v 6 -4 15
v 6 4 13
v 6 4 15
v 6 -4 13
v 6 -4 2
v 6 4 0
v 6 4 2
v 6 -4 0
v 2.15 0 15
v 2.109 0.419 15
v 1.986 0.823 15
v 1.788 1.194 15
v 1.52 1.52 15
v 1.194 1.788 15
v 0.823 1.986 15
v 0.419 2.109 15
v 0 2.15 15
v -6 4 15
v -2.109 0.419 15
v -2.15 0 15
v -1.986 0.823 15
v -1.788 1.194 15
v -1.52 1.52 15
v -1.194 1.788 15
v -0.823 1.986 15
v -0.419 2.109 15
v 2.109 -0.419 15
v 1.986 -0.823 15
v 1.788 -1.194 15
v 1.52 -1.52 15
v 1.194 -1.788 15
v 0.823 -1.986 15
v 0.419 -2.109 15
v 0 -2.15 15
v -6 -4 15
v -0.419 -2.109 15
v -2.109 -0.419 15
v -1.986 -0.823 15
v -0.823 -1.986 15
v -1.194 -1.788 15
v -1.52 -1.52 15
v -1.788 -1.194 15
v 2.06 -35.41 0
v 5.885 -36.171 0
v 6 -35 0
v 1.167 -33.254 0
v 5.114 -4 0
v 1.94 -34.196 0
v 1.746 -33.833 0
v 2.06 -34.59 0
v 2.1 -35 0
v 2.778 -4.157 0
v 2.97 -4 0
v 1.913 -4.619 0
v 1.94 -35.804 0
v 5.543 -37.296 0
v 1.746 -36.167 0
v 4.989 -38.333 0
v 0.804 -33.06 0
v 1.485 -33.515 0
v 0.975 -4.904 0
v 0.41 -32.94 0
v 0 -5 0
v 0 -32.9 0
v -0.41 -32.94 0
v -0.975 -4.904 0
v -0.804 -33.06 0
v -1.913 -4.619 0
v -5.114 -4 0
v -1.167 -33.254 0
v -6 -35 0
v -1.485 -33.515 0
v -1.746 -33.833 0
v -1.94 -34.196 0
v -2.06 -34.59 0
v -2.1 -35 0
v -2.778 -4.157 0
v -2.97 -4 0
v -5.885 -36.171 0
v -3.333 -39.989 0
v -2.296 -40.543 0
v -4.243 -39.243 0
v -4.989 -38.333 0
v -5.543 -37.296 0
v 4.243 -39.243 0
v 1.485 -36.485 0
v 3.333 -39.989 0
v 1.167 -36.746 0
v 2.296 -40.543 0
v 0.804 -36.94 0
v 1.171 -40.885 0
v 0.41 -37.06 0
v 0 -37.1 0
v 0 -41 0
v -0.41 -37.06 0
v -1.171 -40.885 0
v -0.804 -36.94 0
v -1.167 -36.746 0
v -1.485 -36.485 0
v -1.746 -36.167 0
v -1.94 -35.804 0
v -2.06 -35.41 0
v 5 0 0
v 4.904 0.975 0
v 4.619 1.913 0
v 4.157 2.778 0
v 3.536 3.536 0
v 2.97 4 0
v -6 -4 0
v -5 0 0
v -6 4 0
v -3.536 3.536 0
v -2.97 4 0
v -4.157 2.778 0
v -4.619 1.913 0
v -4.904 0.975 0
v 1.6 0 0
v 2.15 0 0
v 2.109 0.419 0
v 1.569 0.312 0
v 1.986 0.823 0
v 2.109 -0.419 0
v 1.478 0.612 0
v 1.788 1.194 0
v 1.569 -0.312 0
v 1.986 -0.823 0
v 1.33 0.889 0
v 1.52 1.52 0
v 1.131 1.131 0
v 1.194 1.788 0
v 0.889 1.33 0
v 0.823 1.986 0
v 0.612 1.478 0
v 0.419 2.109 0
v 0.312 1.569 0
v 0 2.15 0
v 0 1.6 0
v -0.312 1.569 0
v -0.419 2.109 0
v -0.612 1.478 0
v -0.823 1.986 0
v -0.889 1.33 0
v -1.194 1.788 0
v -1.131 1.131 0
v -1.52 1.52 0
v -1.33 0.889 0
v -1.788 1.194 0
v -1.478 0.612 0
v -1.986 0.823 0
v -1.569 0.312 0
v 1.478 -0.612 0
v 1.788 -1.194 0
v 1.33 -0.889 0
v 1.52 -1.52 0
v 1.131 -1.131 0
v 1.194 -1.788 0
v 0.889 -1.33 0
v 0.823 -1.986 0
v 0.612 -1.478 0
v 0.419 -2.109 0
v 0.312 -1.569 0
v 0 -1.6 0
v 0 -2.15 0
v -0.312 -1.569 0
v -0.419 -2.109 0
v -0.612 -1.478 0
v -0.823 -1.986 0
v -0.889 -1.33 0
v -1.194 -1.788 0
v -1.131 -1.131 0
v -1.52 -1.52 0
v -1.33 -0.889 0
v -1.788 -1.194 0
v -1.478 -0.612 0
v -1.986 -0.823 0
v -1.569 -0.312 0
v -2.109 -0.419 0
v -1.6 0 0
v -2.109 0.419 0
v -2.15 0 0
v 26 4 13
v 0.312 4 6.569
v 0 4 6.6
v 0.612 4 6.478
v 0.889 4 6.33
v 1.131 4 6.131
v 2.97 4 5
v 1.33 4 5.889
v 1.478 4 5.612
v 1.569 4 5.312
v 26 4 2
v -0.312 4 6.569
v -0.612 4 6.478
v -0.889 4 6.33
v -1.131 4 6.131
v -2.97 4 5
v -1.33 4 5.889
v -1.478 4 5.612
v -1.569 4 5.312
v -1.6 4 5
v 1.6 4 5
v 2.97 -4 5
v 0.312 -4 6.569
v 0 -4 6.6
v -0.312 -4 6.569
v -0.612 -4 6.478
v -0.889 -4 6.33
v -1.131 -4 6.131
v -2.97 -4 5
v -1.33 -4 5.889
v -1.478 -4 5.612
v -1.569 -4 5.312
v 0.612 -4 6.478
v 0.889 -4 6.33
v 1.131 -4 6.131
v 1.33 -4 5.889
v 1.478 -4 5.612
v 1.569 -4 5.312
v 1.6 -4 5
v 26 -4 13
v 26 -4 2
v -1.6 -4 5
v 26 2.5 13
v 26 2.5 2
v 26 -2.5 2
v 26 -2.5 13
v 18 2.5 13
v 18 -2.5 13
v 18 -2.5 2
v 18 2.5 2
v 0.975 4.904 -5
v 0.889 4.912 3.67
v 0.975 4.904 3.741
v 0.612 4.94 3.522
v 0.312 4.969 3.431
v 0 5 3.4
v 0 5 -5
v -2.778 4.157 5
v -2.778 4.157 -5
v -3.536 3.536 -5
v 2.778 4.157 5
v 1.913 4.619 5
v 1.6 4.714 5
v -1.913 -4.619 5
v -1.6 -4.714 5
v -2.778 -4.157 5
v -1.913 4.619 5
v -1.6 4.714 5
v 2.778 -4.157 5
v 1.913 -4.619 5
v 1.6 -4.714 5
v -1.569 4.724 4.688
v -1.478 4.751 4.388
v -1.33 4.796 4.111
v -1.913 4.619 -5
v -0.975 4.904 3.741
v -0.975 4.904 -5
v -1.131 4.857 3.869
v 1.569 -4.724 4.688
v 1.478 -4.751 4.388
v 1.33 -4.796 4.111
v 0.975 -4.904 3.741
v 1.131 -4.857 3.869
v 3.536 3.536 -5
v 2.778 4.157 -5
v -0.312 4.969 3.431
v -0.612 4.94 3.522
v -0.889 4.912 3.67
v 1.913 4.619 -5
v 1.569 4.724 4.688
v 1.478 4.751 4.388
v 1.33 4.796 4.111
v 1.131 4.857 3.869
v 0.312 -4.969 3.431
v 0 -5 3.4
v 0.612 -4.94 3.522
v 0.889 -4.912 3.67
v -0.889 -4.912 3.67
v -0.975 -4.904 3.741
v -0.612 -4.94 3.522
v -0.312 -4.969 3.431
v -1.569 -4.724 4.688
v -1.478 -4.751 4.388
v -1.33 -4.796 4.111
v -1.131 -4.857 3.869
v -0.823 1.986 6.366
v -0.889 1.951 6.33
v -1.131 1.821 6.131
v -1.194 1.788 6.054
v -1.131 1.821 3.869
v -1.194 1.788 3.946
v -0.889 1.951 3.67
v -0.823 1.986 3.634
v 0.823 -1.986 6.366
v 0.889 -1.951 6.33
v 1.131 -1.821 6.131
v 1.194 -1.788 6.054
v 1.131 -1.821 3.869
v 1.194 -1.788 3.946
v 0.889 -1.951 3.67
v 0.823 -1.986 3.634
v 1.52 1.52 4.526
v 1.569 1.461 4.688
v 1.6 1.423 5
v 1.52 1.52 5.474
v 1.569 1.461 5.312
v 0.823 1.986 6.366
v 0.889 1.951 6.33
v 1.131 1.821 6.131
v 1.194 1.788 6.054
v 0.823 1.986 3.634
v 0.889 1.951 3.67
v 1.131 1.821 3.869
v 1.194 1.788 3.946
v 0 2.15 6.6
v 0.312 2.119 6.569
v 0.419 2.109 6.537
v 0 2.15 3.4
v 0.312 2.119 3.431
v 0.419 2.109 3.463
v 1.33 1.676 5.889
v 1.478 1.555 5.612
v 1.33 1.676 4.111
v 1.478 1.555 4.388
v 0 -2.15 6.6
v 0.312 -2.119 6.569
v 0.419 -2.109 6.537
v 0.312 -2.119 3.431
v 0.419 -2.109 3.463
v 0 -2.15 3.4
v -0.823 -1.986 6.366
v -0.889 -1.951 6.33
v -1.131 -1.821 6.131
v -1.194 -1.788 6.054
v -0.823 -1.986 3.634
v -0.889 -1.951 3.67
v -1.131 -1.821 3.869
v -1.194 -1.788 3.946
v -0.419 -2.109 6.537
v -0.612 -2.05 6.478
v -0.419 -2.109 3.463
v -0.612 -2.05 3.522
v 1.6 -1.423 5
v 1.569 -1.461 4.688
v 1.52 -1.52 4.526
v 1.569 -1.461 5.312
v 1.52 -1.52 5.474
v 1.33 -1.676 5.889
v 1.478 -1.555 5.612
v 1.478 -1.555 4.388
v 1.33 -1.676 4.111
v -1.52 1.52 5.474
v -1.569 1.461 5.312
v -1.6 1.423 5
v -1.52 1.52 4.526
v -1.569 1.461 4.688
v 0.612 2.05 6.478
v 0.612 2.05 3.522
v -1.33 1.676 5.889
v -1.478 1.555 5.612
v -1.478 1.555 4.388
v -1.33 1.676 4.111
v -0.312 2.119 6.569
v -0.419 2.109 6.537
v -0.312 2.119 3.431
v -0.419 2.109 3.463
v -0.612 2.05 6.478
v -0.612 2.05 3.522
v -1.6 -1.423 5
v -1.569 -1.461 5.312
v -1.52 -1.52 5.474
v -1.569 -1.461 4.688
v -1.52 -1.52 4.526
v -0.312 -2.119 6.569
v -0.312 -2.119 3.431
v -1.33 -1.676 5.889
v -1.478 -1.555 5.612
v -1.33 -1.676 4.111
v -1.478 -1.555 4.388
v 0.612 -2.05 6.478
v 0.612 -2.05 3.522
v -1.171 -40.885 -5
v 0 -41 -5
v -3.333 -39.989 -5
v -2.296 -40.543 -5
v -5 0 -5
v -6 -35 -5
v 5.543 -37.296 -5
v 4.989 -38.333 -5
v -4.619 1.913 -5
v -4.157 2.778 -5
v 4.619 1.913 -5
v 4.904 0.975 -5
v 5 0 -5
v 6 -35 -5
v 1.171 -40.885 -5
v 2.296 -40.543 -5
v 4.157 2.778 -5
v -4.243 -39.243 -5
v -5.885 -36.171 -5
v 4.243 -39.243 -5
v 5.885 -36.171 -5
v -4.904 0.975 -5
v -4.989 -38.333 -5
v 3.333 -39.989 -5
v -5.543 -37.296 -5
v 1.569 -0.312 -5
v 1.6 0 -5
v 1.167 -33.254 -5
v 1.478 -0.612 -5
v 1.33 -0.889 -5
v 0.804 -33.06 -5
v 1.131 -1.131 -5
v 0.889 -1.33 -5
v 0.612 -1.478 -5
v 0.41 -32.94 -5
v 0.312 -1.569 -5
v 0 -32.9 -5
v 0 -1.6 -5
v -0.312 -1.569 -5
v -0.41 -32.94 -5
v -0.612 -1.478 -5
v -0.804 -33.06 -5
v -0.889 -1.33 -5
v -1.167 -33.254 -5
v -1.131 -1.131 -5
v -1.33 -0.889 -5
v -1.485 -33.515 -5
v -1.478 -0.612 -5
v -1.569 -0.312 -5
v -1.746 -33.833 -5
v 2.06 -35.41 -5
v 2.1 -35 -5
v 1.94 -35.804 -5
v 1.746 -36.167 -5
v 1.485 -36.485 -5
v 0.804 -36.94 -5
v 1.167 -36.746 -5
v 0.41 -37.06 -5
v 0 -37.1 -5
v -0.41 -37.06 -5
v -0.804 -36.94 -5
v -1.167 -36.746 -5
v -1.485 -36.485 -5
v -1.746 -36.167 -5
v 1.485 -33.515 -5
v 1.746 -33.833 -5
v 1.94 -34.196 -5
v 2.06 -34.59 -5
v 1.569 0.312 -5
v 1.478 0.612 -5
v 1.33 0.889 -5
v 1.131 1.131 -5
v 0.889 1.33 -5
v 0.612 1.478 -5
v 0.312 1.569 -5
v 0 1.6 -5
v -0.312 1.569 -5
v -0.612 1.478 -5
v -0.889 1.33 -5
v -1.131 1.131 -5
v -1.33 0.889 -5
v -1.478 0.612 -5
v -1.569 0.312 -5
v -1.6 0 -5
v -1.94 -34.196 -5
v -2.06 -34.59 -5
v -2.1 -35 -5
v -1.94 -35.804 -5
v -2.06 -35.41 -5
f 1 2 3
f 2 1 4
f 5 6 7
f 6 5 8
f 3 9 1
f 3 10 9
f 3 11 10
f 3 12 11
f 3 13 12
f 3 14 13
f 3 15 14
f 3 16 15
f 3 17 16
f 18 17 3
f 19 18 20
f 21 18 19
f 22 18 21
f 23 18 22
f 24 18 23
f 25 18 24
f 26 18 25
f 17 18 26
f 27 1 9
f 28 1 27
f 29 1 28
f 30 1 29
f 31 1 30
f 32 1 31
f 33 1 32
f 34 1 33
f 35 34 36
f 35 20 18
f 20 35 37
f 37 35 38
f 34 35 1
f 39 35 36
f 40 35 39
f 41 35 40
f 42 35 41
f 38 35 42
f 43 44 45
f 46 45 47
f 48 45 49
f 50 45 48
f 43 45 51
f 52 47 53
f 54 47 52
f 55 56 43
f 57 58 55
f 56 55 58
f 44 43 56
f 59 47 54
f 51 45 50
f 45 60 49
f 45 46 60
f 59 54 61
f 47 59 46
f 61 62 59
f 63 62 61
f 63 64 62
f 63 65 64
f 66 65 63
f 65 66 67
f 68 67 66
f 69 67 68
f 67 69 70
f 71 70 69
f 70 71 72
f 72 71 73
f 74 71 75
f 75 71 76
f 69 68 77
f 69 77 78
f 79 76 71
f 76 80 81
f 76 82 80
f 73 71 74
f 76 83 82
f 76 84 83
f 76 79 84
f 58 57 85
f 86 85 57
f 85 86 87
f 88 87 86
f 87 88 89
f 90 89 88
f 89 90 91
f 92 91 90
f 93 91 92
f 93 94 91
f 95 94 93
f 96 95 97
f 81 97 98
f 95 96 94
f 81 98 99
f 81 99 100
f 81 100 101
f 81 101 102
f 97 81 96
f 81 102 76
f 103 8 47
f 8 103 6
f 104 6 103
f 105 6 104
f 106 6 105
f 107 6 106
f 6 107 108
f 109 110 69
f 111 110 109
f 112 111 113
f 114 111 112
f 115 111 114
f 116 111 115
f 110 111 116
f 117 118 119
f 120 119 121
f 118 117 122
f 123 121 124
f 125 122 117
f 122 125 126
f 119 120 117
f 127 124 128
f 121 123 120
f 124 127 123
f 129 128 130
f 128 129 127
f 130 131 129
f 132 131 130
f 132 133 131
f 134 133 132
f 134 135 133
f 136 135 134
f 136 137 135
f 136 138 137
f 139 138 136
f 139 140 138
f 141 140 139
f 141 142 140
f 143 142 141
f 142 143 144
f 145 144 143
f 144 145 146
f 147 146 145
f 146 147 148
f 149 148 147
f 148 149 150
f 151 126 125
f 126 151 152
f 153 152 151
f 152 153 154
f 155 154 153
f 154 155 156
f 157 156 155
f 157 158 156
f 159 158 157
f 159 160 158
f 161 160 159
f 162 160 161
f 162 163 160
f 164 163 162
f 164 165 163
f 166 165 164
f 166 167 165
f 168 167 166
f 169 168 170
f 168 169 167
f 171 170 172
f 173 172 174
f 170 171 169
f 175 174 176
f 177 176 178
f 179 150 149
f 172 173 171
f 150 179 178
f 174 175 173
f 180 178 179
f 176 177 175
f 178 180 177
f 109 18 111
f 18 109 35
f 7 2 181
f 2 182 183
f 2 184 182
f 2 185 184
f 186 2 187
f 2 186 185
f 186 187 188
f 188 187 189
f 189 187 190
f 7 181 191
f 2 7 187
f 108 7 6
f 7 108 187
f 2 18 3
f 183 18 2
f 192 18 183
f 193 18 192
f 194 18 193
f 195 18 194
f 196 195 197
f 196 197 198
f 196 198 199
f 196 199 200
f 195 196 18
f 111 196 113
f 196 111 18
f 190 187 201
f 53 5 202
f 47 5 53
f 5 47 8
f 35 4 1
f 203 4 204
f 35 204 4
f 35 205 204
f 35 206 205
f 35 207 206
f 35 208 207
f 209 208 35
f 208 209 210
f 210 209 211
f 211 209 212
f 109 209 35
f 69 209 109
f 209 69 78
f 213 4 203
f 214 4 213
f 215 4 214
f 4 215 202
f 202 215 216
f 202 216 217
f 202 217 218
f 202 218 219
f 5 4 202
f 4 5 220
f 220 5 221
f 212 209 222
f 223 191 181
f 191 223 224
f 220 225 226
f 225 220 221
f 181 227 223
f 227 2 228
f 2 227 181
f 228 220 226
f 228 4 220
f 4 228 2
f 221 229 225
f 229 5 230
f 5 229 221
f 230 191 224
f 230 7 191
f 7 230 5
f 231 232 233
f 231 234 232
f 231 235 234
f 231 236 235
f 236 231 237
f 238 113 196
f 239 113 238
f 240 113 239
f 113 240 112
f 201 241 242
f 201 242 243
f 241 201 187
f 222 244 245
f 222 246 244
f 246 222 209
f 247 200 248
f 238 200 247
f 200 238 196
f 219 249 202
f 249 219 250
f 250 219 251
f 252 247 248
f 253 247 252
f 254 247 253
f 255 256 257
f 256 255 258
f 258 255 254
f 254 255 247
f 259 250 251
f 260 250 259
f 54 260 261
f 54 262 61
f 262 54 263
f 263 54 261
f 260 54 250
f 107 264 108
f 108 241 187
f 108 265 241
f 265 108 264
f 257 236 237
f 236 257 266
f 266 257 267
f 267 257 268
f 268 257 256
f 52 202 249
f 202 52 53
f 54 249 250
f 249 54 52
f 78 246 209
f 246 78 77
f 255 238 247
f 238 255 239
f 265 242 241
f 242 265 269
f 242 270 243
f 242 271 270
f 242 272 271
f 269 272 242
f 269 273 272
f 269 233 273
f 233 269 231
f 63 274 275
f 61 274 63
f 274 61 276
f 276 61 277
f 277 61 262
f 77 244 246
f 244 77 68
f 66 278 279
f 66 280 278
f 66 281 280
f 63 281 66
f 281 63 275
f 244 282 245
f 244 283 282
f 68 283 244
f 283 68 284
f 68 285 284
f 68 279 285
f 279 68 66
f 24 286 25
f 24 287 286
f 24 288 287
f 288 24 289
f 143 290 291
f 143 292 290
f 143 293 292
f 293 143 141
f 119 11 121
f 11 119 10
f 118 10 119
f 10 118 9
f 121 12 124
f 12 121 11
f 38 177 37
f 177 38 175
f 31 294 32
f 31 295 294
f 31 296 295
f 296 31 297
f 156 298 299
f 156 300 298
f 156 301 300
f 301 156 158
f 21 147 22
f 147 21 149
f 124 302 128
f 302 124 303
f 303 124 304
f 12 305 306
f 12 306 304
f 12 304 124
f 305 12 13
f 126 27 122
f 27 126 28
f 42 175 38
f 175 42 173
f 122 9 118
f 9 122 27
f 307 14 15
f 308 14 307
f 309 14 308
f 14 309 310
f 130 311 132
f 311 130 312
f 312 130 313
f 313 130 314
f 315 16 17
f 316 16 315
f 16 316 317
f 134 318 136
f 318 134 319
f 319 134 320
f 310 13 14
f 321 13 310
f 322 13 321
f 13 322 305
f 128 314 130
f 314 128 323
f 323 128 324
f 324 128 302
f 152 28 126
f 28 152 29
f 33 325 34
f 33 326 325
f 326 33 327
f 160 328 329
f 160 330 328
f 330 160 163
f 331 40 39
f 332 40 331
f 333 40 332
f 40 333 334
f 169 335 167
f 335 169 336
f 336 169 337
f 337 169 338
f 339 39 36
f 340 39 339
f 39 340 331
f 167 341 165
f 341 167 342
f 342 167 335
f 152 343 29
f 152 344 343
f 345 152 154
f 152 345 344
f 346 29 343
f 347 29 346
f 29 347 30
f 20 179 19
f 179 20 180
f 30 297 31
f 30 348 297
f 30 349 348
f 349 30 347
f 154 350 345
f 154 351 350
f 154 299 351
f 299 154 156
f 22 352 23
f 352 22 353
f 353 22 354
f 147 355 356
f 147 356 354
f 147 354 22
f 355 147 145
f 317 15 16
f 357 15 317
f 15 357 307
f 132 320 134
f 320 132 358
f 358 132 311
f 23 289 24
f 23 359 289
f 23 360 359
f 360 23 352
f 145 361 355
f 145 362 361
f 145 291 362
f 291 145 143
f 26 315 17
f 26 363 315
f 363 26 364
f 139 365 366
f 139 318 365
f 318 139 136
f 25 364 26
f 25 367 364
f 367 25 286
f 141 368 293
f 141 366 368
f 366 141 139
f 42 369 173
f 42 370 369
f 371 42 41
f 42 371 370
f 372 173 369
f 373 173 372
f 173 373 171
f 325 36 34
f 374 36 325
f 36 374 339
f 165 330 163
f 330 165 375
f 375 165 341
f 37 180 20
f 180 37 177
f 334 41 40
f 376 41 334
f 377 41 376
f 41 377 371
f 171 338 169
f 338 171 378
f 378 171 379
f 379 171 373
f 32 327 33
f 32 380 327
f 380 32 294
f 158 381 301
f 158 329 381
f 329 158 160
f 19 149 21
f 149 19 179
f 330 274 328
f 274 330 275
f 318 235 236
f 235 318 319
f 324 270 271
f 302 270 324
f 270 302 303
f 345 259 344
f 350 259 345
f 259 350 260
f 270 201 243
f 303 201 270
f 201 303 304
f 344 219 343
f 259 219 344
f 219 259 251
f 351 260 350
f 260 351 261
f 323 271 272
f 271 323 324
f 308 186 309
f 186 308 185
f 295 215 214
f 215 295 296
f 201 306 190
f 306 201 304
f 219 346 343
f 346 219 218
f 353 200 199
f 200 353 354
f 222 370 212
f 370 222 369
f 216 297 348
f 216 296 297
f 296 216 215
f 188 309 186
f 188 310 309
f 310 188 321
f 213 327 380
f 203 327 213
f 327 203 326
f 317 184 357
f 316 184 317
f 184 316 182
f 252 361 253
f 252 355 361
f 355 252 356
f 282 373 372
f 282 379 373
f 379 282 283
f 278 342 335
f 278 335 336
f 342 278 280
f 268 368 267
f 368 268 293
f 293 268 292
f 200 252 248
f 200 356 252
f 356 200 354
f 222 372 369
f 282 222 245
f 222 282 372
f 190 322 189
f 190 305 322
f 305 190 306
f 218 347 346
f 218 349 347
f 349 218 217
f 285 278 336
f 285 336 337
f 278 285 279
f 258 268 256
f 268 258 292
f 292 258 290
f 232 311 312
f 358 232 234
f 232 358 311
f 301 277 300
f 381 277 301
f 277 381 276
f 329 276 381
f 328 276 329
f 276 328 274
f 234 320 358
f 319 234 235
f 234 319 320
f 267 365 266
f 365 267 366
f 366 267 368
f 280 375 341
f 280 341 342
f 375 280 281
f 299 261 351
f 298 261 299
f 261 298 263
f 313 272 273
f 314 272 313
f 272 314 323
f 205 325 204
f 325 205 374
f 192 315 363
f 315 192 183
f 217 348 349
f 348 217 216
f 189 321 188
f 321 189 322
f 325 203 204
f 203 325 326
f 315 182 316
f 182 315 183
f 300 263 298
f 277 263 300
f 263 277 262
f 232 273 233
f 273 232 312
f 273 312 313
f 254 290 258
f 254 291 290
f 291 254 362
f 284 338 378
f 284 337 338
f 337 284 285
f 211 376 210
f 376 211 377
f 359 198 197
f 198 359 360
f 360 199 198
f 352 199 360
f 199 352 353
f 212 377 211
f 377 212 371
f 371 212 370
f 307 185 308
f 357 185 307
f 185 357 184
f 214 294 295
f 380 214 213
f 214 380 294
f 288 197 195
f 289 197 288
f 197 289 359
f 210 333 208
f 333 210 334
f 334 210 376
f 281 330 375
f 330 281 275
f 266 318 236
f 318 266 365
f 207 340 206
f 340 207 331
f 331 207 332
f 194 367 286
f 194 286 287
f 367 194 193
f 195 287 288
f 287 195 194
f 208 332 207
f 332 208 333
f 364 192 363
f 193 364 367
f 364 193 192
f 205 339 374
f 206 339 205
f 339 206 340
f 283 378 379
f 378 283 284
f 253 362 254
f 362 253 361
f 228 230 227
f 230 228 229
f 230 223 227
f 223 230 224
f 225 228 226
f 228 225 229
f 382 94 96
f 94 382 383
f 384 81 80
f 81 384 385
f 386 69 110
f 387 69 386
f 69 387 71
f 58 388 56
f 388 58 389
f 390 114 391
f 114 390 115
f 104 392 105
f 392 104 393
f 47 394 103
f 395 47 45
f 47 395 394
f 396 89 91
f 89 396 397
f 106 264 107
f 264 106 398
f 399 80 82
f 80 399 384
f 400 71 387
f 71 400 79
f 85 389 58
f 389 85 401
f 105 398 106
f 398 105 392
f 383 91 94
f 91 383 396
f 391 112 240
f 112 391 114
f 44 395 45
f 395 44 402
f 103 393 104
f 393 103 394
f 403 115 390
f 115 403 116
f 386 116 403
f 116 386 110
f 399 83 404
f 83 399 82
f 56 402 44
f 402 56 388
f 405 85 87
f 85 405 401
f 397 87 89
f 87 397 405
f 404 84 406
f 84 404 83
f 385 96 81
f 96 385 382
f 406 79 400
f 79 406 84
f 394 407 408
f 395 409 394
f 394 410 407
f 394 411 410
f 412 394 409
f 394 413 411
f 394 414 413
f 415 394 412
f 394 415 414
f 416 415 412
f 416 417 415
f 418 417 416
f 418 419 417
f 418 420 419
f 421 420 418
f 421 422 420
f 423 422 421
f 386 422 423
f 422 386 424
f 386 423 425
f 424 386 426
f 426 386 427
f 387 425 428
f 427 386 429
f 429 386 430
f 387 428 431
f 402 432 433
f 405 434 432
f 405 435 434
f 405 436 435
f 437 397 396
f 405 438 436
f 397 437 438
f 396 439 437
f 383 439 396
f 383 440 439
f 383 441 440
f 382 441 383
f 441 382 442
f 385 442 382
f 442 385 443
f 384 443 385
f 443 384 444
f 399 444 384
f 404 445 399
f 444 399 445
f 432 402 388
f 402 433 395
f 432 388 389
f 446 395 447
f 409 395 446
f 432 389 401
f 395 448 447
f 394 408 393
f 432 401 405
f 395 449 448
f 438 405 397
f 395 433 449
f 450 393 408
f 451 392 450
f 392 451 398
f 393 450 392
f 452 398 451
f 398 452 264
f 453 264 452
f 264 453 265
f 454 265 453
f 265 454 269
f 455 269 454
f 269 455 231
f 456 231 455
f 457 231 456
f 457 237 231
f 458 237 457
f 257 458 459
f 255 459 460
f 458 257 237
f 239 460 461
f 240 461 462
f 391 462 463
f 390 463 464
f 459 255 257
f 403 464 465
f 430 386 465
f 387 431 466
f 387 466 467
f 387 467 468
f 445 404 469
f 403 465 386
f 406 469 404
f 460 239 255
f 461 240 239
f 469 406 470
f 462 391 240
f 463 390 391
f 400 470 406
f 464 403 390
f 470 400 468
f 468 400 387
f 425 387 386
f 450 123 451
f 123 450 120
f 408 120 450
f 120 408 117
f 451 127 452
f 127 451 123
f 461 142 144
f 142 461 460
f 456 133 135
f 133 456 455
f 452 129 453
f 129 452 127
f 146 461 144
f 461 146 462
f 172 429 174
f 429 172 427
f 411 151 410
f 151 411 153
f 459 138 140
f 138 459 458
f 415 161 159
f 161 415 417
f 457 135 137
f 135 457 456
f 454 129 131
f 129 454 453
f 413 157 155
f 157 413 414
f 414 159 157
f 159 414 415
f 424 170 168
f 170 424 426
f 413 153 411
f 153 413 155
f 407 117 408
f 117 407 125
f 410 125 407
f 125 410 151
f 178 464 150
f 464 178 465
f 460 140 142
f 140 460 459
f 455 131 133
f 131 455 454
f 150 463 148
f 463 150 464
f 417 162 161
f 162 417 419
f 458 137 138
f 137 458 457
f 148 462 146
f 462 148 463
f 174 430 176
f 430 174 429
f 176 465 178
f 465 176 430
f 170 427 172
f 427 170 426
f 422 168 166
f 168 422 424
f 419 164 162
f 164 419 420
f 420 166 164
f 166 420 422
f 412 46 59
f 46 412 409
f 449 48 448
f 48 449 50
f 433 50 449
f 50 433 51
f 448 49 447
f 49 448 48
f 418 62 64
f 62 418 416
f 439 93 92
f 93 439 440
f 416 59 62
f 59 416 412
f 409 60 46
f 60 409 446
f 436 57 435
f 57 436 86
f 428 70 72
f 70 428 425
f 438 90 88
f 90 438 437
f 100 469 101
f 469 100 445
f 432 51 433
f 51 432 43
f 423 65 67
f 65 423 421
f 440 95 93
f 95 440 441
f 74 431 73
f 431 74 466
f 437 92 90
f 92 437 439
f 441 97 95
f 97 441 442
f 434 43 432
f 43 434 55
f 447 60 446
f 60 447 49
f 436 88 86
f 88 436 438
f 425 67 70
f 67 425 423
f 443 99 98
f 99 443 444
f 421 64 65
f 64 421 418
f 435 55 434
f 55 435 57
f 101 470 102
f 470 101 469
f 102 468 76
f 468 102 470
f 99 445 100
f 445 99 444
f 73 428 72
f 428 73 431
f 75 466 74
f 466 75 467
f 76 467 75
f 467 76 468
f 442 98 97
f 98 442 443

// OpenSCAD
// file: common.scad
/*
 * WAVE OCEAN V10 - HORIZONTAL LAYERED WAVE SYSTEM
 * COMMON PARAMETERS
 *
 * Hokusai-style waves: 2D profiles stacked in depth layers
 * Each wave is 3-4 layers (body, curl, foam)
 * Layers move with phase offset for rolling illusion
 *
 * This creates the dramatic Japanese woodblock print aesthetic
 */

// ============================================
// PRINT TOLERANCES
// ============================================

TOL_CLEARANCE = 0.2;
TOL_SLIDING = 0.3;

// ============================================
// HARDWARE
// ============================================

BEARING_608_ID = 8;
BEARING_608_OD = 22;
BEARING_608_H = 7;

SHAFT_DIA = 8;
M3_HOLE = 3.2;
M4_HOLE = 4.2;

// ============================================
// SCENE DIMENSIONS
// ============================================

SCENE_WIDTH = 250;               // Total width of wave scene
SCENE_HEIGHT = 120;              // Visible wave area height
SCENE_DEPTH = 60;                // Front to back depth

// ============================================
// WAVE CONFIGURATION
// ============================================

NUM_WAVES = 3;                   // Number of complete wave forms
WAVE_SPACING = SCENE_WIDTH / NUM_WAVES;  // ~83mm per wave

// Layer configuration per wave
NUM_LAYERS = 4;                  // Layers per wave
LAYER_SPACING = 10;              // Depth between layers (Y direction)
LAYER_THICKNESS = 4;             // Thickness of each profile piece

// Wave motion
WAVE_AMPLITUDE = 15;             // Vertical travel
PHASE_OFFSET_PER_LAYER = 20;     // Degrees phase difference between layers

// ============================================
// LAYER DEFINITIONS
// Layer 0 = Frontmost (foam/spray)
// Layer 3 = Backmost (wave body base)
// ============================================

// Heights relative to base
LAYER_HEIGHTS = [
    45,     // Layer 0: Foam spray (front, highest)
    50,     // Layer 1: Curl tip
    55,     // Layer 2: Wave crest
    40      // Layer 3: Wave body (back, lowest)
];

// Y positions (depth into scene)
function layer_y(l) = -SCENE_DEPTH/2 + l * LAYER_SPACING + LAYER_SPACING/2;

// Phase offset per layer (front layers lag behind)
function layer_phase_offset(l) = l * PHASE_OFFSET_PER_LAYER;

// ============================================
// CAM SYSTEM (drives wave motion)
// ============================================

CAM_LENGTH = SCENE_WIDTH + 40;   // 290mm
CAM_CORE_RADIUS = 12;
CAM_RIDGE_HEIGHT = WAVE_AMPLITUDE;
CAM_MAX_RADIUS = CAM_CORE_RADIUS + CAM_RIDGE_HEIGHT;

// One cam ridge per wave
CAM_RIDGES = NUM_WAVES;
HELIX_TURNS = NUM_WAVES;         // 3 ridges = 3 waves visible

// ============================================
// MOUNTING SYSTEM
// ============================================

// Each wave layer has a vertical guide rod
GUIDE_ROD_DIA = 4;               // 4mm steel rod
GUIDE_ROD_LENGTH = WAVE_AMPLITUDE + 30;

// Slider block connects layer to guide rod
SLIDER_WIDTH = 12;
SLIDER_DEPTH = LAYER_THICKNESS + 4;
SLIDER_HEIGHT = 15;

// Follower arm connects slider to cam
FOLLOWER_ARM_LENGTH = 35;
FOLLOWER_ARM_WIDTH = 8;

// ============================================
// ASSEMBLY POSITIONS
// ============================================

BASE_THICKNESS = 5;
CAM_CENTER_Z = -30;              // Below visible scene
CAM_CENTER_Y = 0;

// Guide frame position
GUIDE_FRAME_Z = CAM_CENTER_Z + CAM_MAX_RADIUS + 10;

// ============================================
// COLORS
// ============================================

C_WAVE_BODY = [0.1, 0.25, 0.5];      // Dark blue (back layer)
C_WAVE_CREST = [0.15, 0.35, 0.6];    // Medium blue
C_WAVE_CURL = [0.2, 0.45, 0.7];      // Light blue
C_WAVE_FOAM = [0.95, 0.97, 1.0];     // White
C_FRAME = [0.3, 0.25, 0.2];          // Dark wood
C_CAM = [0.6, 0.5, 0.3];
C_MECHANISM = [0.5, 0.5, 0.55];

// Layer colors (front to back)
LAYER_COLORS = [
    C_WAVE_FOAM,    // Layer 0: Foam
    C_WAVE_CURL,    // Layer 1: Curl
    C_WAVE_CREST,   // Layer 2: Crest
    C_WAVE_BODY     // Layer 3: Body
];

// ============================================
// HELPER FUNCTIONS
// ============================================

// Cam phase at position X
function cam_phase(x, theta) =
    let(helix_phase = ((x + CAM_LENGTH/2) / CAM_LENGTH) * 360 * HELIX_TURNS)
    helix_phase + theta;

// Cam surface height at position X, rotation theta
function cam_height(x, theta) =
    let(phase = cam_phase(x, theta))
    CAM_CORE_RADIUS + CAM_RIDGE_HEIGHT * max(0, cos(phase - 90));

// Wave X position (center of each wave)
function wave_x(w) = w * WAVE_SPACING - SCENE_WIDTH/2 + WAVE_SPACING/2;

// Layer Z position for wave w, layer l, at rotation theta
function layer_z(w, l, theta) =
    let(x = wave_x(w))
    let(phase_offset = layer_phase_offset(l))
    let(adjusted_theta = theta - phase_offset)
    let(base_z = GUIDE_FRAME_Z)
    let(cam_z = cam_height(x, adjusted_theta) - CAM_CORE_RADIUS)
    base_z + cam_z;

// ============================================
// QUALITY
// ============================================

$fn = 48;
// main file
/*
 * LAYER SLIDER - Mounting Block for Wave Layers
 *
 * Each wave layer attaches to a slider block
 * Slider rides on vertical guide rod
 * Follower arm connects to cam below
 *
 * Printable part: 12x (3 waves × 4 layers)
 */

include <common.scad>

$fn = 32;

// ============================================
// SLIDER DIMENSIONS
// ============================================

GUIDE_HOLE_DIA = GUIDE_ROD_DIA + TOL_SLIDING;  // 4.3mm
FOLLOWER_PIVOT_DIA = 3;                          // M3 pivot
LAYER_MOUNT_WIDTH = 20;
LAYER_MOUNT_SLOT_WIDTH = LAYER_THICKNESS + 1;

// ============================================
// MAIN MODULE
// ============================================

module layer_slider() {
    difference() {
        union() {
            // Main slider body
            slider_body();

            // Layer mounting tab
            layer_mount();

            // Follower arm pivot boss
            follower_pivot_boss();
        }

        // Guide rod hole (vertical)
        guide_rod_hole();

        // Follower pivot hole
        follower_pivot_hole();

        // Layer mounting slot
        layer_mount_slot();
    }
}

// ============================================
// SLIDER BODY
// ============================================

module slider_body() {
    // Main block that slides on guide rod
    translate([-SLIDER_WIDTH/2, -SLIDER_DEPTH/2, 0])
        cube([SLIDER_WIDTH, SLIDER_DEPTH, SLIDER_HEIGHT]);
}

// ============================================
// LAYER MOUNT TAB
// ============================================

module layer_mount() {
    // Tab extending to side for wave layer attachment
    mount_height = SLIDER_HEIGHT - 4;

    translate([SLIDER_WIDTH/2, -SLIDER_DEPTH/2, 2])
        cube([LAYER_MOUNT_WIDTH, SLIDER_DEPTH, mount_height]);
}

// ============================================
// FOLLOWER PIVOT BOSS
// ============================================

module follower_pivot_boss() {
    // Boss on bottom for follower arm attachment
    boss_dia = 10;

    translate([0, 0, 0])
        cylinder(d = boss_dia, h = 5);
}

// ============================================
// GUIDE ROD HOLE
// ============================================

module guide_rod_hole() {
    // Vertical hole for guide rod
    translate([0, 0, -1])
        cylinder(d = GUIDE_HOLE_DIA, h = SLIDER_HEIGHT + 2);
}

// ============================================
// FOLLOWER PIVOT HOLE
// ============================================

module follower_pivot_hole() {
    // Horizontal hole for follower arm pivot pin
    translate([0, -SLIDER_DEPTH/2 - 1, 5])
    rotate([-90, 0, 0])
        cylinder(d = FOLLOWER_PIVOT_DIA + TOL_CLEARANCE, h = SLIDER_DEPTH + 2);
}

// ============================================
// LAYER MOUNT SLOT
// ============================================

module layer_mount_slot() {
    // Slot to capture wave layer profile edge
    slot_depth = 8;

    translate([SLIDER_WIDTH/2 + LAYER_MOUNT_WIDTH - slot_depth,
               -LAYER_MOUNT_SLOT_WIDTH/2,
               -1])
        cube([slot_depth + 1, LAYER_MOUNT_SLOT_WIDTH, SLIDER_HEIGHT + 2]);
}

// ============================================
// FOLLOWER ARM
// ============================================

module follower_arm() {
    // Arm connecting slider to cam
    // Pivot at top, roller at bottom

    arm_thickness = 5;

    difference() {
        union() {
            // Main arm
            hull() {
                // Top pivot end
                cylinder(d = 10, h = arm_thickness);

                // Bottom roller end
                translate([0, -FOLLOWER_ARM_LENGTH, 0])
                    cylinder(d = 12, h = arm_thickness);
            }
        }

        // Pivot hole (top)
        translate([0, 0, -1])
            cylinder(d = FOLLOWER_PIVOT_DIA + TOL_CLEARANCE, h = arm_thickness + 2);

        // Roller axle hole (bottom)
        translate([0, -FOLLOWER_ARM_LENGTH, -1])
            cylinder(d = 4 + TOL_CLEARANCE, h = arm_thickness + 2);
    }
}

// ============================================
// RENDER
// ============================================

color(C_MECHANISM)
layer_slider();

// Show follower arm
translate([0, 0, -5])
rotate([0, 0, 0])
color(C_MECHANISM)
    follower_arm();

// Show guide rod ghost
%translate([0, 0, -10])
    cylinder(d = GUIDE_ROD_DIA, h = GUIDE_ROD_LENGTH);

echo("=== LAYER SLIDER ===");
echo(str("Size: ", SLIDER_WIDTH, " x ", SLIDER_DEPTH, " x ", SLIDER_HEIGHT, "mm"));
echo("Print quantity: 12 (3 waves × 4 layers)");
echo("Also print: 12 follower arms");
